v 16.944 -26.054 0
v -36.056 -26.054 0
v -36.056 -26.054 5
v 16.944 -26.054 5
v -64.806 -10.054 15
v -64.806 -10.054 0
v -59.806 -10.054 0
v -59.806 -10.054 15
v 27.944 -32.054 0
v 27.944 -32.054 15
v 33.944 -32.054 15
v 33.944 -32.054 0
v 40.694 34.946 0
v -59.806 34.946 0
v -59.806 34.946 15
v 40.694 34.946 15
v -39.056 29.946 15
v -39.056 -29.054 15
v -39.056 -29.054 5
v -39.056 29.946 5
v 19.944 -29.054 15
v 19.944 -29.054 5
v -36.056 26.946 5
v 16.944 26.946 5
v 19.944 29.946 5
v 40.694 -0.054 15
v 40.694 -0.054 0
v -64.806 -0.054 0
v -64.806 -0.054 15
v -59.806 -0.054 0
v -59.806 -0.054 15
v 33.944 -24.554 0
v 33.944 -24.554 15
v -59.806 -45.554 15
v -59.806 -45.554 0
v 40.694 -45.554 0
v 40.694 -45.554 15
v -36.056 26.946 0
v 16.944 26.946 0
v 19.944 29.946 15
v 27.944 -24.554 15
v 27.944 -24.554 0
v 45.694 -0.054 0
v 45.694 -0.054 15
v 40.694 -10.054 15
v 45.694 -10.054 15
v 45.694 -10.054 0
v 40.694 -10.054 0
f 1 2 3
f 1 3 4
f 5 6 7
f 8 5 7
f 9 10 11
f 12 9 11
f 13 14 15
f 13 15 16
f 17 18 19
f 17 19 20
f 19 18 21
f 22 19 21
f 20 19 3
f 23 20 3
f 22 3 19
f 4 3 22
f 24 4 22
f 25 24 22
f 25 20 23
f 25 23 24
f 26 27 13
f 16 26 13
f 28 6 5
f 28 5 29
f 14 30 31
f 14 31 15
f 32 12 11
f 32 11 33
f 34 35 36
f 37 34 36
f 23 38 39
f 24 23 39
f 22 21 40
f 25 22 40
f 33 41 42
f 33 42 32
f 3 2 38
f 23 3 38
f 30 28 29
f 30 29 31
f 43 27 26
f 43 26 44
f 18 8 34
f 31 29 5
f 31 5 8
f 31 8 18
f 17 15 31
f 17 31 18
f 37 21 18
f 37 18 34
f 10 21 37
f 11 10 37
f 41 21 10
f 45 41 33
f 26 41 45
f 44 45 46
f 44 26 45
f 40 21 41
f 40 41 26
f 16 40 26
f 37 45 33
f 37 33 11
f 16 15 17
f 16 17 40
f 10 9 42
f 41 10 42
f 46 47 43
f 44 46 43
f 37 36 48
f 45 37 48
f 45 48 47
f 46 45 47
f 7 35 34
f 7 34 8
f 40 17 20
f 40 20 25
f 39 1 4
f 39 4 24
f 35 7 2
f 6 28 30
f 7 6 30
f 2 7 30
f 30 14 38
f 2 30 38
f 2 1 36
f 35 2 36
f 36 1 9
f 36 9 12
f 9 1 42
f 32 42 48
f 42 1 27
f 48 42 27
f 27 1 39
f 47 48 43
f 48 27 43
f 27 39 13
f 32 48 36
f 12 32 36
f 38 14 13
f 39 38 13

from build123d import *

# Parameters (mm, degrees)
SKETCH_1_W          = 5
SKETCH_1_H          = 10
SKETCH_1_W_2        = 100.5
SKETCH_1_H_2        = 80.5
SKETCH_1_W_3        = 6
SKETCH_1_H_3        = 7.5
SKETCH_1_W_4        = 53
SKETCH_1_H_4        = 53
EXTRUDE_1_DEPTH     = 15
SKETCH_2_W          = 59
SKETCH_2_H          = 59
CUT_EXTRUDE_1_DEPTH = 10


with BuildPart() as part:
    # 草圖1 → 填料-伸長1 (new body)
    with BuildSketch(Plane.XY):
        with Locations((-62.305536773, -5.054)):
            Rectangle(SKETCH_1_W, SKETCH_1_H)
        with Locations((-9.555536773, -5.304)):
            Rectangle(SKETCH_1_W_2, SKETCH_1_H_2)
        with Locations((30.944463227, -28.304)):
            Rectangle(SKETCH_1_W_3, SKETCH_1_H_3, mode=Mode.SUBTRACT)
        with Locations((-9.555536773, 0.446)):
            Rectangle(SKETCH_1_W_4, SKETCH_1_H_4, mode=Mode.SUBTRACT)
        with Locations((43.194463227, -5.054)):
            Rectangle(SKETCH_1_W, SKETCH_1_H)
    extrude(amount=EXTRUDE_1_DEPTH)

    # 草圖2 → 除料-伸長1 (cut)
    with BuildSketch(Plane.XY.offset(15)):
        with Locations((-9.555536773, 0.446)):
            Rectangle(SKETCH_2_W, SKETCH_2_H)
    extrude(amount=-CUT_EXTRUDE_1_DEPTH, mode=Mode.SUBTRACT)


solid = part.part
